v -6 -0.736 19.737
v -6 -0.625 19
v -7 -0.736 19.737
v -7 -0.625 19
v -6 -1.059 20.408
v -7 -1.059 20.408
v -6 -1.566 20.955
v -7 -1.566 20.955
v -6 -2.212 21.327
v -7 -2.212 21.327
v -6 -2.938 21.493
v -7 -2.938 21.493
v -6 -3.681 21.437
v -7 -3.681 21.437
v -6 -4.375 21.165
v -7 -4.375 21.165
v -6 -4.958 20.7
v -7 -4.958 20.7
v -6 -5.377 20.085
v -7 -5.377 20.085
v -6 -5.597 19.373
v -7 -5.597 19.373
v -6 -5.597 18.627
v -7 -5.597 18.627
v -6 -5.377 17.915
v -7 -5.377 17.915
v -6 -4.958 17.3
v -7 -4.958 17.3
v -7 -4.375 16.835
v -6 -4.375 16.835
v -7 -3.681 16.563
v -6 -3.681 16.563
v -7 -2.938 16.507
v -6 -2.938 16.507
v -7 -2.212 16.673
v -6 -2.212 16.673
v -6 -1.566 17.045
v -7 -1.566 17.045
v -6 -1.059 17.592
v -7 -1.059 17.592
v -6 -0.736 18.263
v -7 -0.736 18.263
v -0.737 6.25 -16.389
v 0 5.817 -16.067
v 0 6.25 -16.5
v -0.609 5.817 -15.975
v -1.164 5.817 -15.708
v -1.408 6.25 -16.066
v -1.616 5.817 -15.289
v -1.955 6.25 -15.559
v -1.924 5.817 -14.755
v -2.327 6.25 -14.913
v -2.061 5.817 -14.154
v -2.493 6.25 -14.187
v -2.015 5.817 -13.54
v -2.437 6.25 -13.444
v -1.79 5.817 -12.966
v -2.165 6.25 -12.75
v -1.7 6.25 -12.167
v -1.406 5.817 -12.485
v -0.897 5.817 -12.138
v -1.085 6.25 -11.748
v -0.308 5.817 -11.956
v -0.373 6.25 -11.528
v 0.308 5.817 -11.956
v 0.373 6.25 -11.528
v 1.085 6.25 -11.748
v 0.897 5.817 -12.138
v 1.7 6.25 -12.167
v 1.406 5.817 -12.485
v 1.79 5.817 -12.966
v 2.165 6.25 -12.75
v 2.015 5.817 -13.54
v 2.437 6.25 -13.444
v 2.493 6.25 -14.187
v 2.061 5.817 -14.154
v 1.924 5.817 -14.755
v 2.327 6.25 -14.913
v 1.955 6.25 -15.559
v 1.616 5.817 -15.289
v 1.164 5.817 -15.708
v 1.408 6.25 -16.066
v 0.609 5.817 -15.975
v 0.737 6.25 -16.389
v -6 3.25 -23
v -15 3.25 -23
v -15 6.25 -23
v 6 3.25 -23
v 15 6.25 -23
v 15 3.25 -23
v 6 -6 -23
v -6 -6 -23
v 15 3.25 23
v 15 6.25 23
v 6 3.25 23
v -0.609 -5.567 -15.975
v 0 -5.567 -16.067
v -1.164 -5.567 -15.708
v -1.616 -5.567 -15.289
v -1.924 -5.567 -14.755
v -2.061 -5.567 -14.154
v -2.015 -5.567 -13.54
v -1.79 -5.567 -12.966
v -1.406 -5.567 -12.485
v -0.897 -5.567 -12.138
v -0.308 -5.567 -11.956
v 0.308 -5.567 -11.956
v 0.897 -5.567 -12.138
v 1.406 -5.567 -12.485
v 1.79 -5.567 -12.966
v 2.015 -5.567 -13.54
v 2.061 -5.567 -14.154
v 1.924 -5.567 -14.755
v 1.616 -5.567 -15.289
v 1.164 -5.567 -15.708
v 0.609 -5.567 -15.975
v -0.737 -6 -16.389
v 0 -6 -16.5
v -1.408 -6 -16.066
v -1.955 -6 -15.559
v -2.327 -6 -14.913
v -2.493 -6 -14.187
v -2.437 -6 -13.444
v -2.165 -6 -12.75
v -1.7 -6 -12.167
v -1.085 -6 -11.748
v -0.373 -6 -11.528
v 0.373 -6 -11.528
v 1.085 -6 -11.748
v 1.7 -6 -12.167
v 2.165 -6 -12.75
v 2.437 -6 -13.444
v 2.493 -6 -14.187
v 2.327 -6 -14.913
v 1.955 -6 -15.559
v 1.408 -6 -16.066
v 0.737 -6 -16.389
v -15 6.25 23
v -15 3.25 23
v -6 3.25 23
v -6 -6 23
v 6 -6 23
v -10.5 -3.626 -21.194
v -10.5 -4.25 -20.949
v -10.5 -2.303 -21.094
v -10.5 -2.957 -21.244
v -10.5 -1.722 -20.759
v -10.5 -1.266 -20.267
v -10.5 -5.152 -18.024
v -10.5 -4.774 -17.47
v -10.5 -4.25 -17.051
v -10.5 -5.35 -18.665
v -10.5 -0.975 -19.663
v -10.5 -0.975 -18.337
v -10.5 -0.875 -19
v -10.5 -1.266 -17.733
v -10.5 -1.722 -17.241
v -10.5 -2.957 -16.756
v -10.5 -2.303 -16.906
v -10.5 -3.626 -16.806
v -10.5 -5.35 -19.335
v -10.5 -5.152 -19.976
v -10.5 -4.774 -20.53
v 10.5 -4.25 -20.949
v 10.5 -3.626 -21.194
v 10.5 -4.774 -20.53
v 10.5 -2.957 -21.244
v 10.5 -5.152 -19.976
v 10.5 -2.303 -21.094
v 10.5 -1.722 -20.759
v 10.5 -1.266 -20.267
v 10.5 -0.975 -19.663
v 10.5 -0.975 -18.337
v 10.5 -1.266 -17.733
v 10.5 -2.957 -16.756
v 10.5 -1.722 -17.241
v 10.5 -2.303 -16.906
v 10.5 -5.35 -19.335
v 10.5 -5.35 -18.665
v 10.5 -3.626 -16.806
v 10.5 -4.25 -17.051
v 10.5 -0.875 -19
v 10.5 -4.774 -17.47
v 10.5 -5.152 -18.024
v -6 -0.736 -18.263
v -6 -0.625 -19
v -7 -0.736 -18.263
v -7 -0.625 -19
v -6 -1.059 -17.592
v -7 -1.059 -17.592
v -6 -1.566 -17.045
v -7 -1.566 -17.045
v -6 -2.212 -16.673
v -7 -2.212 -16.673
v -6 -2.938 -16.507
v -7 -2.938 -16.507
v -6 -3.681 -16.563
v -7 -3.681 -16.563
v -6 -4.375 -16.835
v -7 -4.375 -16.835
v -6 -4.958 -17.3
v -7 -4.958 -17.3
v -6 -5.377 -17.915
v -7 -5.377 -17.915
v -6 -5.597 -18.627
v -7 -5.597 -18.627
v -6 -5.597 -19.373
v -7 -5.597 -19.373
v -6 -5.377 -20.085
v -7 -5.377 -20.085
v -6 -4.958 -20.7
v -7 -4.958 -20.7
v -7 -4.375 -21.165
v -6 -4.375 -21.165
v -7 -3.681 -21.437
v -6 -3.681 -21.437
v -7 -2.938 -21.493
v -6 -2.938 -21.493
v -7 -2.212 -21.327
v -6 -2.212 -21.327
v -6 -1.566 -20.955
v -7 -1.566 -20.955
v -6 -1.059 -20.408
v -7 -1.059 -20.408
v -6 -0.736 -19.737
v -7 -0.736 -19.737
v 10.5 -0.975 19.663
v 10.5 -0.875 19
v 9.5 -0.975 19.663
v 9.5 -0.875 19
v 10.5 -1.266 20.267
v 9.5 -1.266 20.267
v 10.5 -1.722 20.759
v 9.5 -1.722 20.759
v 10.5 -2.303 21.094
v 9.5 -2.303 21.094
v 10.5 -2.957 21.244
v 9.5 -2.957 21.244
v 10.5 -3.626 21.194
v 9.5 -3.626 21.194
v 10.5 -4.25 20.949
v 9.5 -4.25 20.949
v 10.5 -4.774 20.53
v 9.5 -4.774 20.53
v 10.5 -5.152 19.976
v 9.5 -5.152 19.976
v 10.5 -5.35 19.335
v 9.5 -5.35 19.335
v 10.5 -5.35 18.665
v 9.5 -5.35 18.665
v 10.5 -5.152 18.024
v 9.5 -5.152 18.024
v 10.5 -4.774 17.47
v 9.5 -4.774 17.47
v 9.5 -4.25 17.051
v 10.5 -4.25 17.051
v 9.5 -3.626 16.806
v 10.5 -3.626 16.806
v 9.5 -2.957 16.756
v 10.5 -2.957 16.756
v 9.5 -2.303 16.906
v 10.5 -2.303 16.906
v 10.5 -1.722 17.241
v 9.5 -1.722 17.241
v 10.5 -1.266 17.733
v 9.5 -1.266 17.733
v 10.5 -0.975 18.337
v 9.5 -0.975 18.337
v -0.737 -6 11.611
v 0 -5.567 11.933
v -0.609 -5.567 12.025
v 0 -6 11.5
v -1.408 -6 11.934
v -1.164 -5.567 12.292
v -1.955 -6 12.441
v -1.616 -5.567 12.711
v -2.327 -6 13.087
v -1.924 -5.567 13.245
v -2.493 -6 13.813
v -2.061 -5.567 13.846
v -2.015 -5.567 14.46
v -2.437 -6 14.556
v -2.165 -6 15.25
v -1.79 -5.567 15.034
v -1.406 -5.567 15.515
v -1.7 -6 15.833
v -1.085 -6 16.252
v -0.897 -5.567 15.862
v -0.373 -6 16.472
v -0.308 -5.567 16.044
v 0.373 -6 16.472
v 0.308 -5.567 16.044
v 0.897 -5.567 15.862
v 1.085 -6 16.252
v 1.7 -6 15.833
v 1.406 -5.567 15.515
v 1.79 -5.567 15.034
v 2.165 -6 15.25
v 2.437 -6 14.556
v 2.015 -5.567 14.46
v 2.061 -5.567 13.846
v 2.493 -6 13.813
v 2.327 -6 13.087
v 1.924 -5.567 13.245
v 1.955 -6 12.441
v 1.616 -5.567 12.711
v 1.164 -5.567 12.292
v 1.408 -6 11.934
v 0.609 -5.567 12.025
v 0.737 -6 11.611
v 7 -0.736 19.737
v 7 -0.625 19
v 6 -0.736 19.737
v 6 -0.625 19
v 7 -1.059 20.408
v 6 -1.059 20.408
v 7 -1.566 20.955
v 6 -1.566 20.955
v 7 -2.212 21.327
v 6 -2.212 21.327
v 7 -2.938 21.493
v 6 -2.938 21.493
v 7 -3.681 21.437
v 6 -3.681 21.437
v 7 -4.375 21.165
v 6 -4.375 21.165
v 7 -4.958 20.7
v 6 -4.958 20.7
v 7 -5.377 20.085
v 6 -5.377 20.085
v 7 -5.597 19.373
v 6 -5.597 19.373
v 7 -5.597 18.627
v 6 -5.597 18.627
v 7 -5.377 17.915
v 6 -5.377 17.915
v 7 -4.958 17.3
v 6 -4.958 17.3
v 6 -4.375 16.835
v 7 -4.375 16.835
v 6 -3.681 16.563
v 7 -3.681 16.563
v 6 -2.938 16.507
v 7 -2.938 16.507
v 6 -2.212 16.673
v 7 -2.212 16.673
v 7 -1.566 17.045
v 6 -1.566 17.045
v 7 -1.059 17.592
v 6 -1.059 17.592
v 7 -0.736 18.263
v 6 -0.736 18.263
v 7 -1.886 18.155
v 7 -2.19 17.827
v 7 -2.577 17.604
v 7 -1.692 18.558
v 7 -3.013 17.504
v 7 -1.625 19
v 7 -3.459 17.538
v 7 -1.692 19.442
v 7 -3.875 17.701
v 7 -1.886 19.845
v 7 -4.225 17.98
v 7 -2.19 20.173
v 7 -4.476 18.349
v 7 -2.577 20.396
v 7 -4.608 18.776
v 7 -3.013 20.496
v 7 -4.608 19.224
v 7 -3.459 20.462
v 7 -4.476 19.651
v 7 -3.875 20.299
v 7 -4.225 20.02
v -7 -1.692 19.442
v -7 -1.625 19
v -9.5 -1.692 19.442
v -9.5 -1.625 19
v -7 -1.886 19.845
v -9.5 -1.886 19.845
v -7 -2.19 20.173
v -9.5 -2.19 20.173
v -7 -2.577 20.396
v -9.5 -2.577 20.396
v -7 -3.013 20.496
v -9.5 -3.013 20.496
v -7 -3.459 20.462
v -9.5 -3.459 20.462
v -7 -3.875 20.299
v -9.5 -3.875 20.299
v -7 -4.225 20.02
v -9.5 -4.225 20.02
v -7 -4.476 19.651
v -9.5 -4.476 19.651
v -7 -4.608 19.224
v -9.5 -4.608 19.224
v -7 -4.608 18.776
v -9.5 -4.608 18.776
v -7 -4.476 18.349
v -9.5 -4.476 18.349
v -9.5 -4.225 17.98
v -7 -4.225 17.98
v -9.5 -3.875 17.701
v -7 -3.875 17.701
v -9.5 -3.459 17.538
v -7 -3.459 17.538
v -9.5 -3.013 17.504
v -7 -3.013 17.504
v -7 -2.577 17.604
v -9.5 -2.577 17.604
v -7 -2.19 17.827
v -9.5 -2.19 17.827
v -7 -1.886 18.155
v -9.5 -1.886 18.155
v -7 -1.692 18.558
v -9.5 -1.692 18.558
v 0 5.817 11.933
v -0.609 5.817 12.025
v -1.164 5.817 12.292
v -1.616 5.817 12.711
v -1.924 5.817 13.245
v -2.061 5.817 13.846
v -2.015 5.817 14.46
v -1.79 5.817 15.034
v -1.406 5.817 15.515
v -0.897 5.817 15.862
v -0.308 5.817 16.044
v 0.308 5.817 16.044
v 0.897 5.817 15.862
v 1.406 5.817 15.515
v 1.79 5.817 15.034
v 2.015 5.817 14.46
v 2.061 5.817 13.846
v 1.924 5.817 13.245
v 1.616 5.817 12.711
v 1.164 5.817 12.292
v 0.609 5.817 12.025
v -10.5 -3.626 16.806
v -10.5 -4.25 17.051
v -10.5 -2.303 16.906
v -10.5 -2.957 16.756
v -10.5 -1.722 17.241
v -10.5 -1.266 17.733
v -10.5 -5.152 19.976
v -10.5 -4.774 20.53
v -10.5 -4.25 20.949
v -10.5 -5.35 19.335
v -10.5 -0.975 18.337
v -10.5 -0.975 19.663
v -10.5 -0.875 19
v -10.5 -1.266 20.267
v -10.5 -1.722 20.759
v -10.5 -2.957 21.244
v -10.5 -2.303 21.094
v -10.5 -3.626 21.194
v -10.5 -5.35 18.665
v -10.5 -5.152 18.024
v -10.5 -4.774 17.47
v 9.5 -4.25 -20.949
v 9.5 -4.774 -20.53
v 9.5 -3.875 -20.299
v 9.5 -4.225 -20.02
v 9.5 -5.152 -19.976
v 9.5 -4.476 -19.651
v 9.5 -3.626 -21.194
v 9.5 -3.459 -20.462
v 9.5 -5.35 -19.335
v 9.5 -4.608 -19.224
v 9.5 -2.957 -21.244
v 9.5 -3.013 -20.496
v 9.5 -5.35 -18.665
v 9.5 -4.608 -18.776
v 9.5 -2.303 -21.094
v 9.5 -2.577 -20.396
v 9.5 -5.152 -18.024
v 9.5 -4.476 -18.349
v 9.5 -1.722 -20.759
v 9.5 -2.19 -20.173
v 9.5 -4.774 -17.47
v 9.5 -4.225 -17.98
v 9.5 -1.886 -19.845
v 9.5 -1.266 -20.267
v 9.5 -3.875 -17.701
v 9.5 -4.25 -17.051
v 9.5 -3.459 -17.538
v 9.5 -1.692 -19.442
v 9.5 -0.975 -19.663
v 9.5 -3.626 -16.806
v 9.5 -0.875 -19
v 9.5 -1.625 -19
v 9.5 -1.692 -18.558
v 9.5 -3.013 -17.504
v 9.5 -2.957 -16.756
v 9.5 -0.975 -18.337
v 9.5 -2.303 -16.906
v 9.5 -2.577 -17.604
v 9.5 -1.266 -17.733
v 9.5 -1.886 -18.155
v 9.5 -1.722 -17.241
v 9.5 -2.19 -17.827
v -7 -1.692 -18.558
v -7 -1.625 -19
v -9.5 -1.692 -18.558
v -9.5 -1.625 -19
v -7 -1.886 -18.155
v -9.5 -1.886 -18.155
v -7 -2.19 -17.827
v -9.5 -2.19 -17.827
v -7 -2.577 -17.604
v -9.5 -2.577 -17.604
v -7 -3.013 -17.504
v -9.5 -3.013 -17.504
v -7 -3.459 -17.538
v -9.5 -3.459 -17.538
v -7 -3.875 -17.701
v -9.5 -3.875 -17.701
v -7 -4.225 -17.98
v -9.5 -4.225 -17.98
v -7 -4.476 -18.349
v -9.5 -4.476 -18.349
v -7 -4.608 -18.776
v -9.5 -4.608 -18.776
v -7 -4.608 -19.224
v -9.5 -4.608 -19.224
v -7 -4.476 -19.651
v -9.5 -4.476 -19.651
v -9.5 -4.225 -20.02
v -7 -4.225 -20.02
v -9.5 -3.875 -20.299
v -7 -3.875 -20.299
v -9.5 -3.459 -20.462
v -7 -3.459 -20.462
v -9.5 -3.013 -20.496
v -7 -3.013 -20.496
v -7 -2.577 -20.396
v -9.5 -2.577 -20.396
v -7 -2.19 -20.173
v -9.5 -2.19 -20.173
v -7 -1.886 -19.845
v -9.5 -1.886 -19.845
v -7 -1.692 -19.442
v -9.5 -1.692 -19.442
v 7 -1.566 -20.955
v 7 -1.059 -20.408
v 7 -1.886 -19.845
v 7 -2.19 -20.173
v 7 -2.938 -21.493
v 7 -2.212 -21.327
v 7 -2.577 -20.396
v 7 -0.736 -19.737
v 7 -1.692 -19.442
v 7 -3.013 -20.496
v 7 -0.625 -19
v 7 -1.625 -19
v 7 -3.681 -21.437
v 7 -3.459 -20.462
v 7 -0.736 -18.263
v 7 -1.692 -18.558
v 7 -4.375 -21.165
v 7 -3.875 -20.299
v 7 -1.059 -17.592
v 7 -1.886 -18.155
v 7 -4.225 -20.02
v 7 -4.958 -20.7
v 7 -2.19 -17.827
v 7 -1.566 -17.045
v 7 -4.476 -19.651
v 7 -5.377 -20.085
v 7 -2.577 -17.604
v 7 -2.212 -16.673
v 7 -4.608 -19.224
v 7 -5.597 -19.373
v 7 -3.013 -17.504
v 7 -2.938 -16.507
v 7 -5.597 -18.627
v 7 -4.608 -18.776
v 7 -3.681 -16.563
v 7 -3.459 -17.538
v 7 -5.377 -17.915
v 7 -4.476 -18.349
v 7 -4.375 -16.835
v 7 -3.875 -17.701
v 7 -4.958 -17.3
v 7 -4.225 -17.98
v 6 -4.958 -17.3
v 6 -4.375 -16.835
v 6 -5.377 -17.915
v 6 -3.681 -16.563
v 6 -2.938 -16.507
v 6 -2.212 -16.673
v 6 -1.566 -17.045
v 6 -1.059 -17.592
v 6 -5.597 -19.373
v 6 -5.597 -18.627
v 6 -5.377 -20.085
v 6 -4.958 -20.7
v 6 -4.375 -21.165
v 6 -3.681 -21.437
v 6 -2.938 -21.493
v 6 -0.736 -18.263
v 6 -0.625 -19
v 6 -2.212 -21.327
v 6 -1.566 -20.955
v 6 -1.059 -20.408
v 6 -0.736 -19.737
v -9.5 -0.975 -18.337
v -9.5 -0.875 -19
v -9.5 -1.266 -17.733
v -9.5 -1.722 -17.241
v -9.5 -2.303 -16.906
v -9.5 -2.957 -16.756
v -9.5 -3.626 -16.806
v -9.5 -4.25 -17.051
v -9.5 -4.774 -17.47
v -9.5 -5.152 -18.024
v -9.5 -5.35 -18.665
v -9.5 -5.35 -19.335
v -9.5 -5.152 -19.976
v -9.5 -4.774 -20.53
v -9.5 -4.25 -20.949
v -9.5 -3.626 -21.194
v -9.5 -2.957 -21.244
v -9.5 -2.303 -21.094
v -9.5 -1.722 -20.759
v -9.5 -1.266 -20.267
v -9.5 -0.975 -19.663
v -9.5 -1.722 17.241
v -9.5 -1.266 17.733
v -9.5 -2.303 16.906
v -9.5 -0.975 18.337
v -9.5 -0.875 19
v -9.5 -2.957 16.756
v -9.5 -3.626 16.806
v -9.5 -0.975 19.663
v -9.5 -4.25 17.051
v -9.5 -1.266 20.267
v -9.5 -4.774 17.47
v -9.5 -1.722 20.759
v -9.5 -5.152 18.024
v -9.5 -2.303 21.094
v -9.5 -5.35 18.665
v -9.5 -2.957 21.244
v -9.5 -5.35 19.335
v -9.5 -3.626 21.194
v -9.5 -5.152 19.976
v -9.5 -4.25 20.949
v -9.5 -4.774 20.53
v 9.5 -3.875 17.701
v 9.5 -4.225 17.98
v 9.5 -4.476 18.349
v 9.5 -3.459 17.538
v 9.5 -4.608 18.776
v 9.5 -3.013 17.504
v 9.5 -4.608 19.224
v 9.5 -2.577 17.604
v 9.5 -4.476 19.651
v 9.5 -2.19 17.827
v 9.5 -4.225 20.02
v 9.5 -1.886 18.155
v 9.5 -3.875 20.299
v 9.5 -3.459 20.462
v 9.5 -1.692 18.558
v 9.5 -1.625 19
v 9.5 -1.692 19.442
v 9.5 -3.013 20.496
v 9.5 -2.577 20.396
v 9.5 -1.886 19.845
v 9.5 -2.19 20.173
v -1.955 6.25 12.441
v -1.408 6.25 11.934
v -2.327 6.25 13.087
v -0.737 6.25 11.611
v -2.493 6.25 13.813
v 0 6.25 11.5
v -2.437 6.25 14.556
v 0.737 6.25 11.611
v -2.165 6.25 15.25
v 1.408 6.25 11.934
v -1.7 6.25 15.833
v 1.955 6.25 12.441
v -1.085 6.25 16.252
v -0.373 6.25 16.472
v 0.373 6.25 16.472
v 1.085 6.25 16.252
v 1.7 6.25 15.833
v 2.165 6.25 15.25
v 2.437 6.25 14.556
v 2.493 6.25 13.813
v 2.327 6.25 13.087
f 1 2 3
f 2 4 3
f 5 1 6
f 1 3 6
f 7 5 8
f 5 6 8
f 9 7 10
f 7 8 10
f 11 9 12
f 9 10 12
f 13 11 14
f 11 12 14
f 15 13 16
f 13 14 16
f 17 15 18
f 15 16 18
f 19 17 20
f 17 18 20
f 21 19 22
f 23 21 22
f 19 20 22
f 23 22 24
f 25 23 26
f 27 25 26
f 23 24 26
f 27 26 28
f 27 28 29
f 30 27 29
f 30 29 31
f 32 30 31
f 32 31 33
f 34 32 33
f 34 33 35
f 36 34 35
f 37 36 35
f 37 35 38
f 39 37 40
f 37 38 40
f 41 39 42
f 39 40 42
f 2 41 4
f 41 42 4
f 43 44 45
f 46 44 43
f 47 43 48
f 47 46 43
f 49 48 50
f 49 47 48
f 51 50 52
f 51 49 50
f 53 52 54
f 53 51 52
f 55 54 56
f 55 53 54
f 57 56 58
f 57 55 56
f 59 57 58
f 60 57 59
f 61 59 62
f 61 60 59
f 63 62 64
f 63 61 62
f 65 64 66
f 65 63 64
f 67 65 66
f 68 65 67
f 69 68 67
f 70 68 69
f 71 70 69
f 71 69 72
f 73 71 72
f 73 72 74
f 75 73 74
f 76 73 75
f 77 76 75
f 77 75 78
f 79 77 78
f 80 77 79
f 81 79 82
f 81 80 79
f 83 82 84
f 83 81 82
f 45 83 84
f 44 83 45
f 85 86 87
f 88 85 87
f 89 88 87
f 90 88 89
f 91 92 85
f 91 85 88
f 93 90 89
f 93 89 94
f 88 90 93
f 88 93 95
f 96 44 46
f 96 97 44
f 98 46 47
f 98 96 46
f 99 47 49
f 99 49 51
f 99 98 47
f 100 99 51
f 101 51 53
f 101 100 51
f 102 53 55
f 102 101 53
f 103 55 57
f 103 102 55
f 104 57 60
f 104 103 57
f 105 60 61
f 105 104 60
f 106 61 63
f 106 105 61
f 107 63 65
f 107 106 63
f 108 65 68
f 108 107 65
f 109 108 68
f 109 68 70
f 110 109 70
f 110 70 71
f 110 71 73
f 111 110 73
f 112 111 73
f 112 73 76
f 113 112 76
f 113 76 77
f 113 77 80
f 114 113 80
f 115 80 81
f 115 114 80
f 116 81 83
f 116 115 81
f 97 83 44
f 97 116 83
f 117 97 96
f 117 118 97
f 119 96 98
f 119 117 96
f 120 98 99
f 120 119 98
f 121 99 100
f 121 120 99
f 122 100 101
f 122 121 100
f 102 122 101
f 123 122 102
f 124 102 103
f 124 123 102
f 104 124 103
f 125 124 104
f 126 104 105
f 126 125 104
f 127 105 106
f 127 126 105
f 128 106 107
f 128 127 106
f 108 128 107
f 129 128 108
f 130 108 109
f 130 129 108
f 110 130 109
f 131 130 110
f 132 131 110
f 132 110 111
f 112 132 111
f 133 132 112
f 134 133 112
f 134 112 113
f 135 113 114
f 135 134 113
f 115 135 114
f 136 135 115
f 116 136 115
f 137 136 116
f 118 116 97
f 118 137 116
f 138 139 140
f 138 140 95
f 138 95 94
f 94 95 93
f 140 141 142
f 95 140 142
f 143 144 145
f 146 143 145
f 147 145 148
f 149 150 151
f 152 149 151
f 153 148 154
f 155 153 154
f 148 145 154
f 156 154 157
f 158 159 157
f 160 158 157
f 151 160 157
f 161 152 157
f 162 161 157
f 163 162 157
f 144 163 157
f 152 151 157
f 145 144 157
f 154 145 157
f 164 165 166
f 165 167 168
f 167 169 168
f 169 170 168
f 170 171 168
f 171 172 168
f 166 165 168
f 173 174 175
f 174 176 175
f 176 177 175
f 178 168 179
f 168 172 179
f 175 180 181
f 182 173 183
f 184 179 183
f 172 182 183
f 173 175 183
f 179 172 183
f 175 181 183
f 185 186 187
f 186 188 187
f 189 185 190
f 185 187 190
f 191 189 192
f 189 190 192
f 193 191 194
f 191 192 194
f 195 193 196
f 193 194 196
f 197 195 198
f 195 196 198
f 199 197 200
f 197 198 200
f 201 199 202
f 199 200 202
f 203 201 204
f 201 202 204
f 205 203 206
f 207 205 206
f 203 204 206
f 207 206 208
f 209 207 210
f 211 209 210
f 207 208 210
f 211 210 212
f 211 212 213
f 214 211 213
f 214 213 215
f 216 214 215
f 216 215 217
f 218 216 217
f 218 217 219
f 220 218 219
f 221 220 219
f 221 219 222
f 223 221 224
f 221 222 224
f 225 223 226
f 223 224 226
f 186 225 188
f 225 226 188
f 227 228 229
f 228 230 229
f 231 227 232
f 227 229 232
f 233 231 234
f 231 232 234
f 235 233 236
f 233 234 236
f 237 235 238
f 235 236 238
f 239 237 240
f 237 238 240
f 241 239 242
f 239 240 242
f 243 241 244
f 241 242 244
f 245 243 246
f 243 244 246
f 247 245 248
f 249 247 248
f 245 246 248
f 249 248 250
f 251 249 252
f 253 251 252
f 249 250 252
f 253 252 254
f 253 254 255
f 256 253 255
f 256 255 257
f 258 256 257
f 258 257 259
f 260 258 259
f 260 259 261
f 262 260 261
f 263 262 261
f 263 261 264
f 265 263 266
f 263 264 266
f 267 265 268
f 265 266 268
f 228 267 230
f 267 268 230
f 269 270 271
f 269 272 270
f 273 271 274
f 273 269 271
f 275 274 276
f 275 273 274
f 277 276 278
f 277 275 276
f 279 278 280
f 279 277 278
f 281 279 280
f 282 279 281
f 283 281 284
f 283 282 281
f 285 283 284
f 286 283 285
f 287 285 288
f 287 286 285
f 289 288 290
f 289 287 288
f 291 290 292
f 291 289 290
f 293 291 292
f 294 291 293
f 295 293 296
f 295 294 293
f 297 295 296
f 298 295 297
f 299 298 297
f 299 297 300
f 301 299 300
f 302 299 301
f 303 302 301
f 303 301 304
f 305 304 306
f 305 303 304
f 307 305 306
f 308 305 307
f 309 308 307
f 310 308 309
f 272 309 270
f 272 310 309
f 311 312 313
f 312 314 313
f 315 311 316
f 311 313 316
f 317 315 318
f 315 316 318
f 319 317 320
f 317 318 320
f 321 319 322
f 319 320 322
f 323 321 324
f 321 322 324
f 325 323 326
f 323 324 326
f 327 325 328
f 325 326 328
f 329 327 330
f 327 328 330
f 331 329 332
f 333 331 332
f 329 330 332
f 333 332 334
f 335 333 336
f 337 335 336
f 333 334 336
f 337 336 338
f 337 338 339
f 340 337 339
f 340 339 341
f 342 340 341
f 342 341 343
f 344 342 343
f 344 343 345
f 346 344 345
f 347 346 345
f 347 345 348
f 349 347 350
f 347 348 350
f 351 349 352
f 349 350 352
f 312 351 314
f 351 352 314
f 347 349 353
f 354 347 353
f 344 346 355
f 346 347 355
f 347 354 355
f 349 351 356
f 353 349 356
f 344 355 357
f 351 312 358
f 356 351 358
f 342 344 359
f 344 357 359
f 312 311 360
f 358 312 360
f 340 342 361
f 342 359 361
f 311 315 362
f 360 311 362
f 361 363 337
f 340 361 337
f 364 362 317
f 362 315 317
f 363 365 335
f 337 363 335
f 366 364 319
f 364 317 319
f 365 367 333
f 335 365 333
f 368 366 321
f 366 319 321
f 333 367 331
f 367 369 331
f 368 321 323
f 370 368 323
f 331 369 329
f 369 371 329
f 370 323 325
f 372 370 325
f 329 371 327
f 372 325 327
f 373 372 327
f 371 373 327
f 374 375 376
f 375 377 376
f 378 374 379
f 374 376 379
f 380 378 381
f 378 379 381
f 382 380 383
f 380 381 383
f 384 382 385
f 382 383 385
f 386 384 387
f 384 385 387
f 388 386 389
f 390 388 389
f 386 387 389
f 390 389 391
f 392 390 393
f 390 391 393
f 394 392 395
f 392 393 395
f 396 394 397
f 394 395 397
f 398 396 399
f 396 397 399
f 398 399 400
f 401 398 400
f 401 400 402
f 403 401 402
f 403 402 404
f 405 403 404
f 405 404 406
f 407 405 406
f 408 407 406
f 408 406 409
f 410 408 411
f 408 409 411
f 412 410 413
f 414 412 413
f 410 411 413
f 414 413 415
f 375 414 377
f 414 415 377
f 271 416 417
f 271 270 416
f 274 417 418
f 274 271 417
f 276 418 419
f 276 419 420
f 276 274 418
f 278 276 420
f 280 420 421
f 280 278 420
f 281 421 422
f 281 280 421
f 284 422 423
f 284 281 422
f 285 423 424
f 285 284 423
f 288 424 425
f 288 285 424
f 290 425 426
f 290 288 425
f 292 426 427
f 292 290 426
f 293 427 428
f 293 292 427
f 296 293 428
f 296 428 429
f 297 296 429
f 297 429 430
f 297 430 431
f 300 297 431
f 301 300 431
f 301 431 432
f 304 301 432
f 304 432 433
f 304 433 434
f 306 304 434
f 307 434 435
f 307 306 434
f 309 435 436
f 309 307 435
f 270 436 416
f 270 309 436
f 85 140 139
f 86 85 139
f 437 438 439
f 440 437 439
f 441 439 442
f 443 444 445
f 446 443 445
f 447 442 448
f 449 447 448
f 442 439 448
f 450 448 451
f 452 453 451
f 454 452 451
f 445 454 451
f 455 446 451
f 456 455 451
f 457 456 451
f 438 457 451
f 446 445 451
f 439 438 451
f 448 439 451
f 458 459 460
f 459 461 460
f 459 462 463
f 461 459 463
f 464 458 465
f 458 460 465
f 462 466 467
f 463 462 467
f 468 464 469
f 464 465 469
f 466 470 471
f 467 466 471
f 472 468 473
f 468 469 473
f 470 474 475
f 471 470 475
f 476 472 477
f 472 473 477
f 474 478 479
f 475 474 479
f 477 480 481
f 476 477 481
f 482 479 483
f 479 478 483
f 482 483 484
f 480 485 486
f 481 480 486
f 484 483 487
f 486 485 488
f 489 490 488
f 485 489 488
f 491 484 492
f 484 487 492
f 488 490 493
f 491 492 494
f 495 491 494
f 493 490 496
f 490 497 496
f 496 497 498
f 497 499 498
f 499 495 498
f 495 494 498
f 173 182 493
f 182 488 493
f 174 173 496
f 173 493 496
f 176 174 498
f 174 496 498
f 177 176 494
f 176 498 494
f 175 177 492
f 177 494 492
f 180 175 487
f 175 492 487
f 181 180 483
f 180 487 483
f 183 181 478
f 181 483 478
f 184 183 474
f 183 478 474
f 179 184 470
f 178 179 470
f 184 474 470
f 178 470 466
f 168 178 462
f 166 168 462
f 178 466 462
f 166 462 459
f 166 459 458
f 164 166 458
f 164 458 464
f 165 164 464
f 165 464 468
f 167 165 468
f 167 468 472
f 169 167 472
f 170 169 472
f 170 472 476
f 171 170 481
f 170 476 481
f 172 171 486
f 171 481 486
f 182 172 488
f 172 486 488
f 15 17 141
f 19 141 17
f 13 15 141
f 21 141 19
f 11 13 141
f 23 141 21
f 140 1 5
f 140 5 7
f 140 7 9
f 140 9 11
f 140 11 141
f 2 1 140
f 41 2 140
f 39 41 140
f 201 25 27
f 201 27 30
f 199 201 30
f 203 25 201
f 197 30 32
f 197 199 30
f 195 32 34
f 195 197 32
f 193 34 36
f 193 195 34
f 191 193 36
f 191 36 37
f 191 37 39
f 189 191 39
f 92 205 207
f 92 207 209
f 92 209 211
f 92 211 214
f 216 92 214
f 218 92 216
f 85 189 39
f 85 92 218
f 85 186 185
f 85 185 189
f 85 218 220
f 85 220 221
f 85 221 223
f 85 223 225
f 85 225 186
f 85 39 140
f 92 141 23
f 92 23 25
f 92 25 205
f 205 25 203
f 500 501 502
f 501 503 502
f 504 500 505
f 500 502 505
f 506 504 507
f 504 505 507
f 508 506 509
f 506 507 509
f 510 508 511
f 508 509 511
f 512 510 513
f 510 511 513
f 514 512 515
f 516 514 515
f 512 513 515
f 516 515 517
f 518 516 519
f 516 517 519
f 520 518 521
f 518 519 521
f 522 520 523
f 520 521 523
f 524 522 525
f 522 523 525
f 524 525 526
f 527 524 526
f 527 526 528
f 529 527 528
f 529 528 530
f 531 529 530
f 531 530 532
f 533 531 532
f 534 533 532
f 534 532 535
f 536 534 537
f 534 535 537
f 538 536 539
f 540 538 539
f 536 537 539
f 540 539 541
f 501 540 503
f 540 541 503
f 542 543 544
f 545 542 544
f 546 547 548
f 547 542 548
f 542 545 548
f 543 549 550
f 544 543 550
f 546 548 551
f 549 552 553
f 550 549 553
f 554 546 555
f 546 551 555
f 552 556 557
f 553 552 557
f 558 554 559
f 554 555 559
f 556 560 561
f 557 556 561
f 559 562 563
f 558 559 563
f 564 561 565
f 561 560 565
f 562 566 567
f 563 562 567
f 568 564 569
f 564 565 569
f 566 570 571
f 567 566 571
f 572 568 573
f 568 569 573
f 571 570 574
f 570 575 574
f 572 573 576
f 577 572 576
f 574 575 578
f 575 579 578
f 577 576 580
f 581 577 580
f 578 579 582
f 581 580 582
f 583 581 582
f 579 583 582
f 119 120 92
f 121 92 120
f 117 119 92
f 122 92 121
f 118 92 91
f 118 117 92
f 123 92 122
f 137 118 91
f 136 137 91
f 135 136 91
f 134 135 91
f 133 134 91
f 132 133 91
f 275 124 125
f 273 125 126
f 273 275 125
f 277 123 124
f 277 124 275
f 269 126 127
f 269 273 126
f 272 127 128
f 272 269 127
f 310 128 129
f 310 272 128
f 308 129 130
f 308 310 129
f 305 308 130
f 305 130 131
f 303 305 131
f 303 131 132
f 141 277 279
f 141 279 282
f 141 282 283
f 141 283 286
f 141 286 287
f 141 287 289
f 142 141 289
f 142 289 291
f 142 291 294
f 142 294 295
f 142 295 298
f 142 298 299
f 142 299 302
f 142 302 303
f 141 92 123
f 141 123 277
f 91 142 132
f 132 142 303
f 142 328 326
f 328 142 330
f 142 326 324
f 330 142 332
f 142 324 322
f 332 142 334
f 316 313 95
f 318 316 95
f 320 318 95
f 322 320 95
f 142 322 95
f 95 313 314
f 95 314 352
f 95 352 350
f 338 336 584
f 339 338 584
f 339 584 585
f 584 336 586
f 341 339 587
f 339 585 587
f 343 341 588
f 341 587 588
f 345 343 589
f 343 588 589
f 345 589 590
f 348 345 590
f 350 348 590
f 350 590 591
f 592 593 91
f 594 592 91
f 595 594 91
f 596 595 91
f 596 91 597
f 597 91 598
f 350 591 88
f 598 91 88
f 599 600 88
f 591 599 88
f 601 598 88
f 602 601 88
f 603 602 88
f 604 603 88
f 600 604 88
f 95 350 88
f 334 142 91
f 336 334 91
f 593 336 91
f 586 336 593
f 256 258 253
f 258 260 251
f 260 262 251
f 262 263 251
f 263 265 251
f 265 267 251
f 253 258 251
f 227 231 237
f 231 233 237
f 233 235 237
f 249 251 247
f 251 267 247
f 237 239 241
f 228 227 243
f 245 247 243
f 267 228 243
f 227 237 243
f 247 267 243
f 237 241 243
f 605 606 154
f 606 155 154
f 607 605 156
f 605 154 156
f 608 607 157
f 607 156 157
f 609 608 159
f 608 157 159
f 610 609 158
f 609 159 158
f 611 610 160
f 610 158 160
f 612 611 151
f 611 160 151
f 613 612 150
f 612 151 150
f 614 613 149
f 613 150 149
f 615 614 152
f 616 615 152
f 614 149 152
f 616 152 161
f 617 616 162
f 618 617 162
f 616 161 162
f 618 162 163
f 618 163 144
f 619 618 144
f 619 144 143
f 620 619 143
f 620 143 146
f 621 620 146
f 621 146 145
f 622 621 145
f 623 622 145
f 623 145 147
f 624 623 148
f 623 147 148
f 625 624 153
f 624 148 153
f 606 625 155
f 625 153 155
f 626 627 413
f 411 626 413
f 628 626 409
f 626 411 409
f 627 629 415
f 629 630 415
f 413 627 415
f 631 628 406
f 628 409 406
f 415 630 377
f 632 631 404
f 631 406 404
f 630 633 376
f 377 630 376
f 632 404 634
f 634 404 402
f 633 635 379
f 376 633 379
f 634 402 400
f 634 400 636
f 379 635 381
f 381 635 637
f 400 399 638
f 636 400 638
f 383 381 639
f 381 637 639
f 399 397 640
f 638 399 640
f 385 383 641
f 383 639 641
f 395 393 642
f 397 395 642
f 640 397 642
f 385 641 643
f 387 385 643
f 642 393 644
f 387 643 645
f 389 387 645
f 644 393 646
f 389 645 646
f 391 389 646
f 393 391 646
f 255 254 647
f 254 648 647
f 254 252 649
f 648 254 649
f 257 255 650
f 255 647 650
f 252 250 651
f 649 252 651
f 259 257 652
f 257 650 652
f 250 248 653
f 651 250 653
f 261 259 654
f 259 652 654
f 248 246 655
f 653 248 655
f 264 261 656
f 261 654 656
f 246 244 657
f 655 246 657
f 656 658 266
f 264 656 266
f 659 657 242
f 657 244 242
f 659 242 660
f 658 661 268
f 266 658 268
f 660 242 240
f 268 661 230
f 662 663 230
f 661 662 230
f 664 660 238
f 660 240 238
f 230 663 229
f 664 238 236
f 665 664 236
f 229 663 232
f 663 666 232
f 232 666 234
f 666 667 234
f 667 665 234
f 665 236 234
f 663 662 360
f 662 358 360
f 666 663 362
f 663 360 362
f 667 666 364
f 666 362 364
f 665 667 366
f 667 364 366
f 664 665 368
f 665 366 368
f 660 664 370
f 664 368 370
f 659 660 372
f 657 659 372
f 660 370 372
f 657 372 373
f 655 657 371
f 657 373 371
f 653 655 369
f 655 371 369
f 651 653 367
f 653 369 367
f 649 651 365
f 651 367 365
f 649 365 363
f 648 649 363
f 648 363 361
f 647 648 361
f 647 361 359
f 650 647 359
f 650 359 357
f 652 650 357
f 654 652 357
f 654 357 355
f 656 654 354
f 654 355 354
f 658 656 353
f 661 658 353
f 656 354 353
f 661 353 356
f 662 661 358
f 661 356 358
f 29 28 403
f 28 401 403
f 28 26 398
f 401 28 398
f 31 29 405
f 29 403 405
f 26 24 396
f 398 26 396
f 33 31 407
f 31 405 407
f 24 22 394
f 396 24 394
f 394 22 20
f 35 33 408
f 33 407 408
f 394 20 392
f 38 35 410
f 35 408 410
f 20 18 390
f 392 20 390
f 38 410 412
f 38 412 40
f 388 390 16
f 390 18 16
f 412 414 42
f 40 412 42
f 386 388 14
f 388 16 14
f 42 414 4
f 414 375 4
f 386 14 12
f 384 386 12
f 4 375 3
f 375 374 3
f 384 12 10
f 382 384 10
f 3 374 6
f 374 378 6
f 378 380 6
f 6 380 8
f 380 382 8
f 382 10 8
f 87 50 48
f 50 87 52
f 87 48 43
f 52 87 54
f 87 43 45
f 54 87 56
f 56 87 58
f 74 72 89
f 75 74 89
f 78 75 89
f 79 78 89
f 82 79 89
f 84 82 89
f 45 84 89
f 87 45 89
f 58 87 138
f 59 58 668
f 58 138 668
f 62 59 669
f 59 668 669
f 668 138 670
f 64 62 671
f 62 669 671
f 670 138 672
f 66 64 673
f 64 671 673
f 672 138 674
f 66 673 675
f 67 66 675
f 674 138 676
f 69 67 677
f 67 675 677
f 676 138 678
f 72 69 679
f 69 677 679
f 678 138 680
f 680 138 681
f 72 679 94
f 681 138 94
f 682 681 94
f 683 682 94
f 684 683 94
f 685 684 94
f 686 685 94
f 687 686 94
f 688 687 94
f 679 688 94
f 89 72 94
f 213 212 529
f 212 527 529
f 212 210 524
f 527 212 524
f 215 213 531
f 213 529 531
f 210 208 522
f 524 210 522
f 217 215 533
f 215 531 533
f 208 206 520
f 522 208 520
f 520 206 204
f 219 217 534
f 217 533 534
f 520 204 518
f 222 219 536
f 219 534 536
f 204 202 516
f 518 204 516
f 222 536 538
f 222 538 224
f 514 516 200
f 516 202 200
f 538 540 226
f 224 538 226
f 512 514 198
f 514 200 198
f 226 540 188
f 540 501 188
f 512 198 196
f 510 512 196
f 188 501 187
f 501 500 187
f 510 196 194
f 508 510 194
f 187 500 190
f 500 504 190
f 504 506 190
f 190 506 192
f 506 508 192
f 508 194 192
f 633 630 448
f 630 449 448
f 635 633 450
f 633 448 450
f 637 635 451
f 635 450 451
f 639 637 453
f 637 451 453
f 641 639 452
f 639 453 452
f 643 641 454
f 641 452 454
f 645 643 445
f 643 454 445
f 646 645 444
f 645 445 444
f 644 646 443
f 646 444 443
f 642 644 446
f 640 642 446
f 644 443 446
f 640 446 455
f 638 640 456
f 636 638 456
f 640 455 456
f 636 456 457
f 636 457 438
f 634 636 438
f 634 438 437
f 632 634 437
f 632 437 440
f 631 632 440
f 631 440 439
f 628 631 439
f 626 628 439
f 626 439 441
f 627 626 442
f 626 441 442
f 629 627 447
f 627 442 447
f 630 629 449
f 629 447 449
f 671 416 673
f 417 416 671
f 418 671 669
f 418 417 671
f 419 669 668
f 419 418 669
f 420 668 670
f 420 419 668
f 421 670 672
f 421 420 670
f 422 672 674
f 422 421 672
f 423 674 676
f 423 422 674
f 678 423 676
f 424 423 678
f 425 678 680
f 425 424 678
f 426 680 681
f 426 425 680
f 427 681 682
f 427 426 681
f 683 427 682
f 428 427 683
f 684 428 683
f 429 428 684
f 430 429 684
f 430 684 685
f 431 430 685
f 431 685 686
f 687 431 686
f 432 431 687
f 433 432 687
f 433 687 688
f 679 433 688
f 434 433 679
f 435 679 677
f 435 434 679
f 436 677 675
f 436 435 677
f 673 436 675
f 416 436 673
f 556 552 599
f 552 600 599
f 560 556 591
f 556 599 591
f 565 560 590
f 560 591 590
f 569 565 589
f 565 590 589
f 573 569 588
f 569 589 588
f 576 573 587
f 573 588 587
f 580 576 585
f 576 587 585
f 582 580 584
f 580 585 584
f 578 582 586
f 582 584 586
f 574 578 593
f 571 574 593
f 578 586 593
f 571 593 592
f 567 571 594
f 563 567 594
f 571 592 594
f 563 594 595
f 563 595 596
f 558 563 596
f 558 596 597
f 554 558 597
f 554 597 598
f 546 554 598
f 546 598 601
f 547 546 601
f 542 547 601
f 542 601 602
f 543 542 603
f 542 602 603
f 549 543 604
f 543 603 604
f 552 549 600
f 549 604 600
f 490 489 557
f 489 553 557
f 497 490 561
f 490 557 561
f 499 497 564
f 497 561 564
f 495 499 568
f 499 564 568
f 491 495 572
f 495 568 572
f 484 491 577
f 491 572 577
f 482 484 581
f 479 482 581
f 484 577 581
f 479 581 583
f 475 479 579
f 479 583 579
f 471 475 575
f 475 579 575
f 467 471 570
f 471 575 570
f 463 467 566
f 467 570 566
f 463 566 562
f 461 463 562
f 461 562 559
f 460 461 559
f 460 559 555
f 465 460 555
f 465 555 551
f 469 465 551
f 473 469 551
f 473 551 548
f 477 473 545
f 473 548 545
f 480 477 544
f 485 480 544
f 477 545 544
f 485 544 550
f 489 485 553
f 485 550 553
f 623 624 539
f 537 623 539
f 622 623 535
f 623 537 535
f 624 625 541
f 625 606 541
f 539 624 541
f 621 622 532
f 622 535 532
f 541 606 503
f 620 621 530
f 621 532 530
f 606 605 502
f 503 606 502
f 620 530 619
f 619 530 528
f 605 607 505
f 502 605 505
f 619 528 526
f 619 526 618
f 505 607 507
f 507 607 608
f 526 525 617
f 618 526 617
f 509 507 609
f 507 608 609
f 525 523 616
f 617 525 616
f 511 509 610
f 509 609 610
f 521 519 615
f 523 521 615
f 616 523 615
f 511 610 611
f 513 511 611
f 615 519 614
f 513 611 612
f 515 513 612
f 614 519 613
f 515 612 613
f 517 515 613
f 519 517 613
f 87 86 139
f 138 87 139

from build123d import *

# Parameters (mm, degrees)
SKETCH_1_W                    = 30
SKETCH_1_H                    = 46
EXTRUDE_1_DEPTH               = 12.25
SKETCH_2_W                    = 9
SKETCH_2_H                    = 9.25
CUT_EXTRUDE_1_DEPTH           = 47
SKETCH_3_W                    = 9
SKETCH_3_H                    = 9.25
CUT_EXTRUDE_2_DEPTH           = 47
HOLE_WIZARD_M3_5_1_AT_2_COUNT = 2
HOLE_WIZARD_M3_5_1_AT_2_PITCH = 28


with BuildPart() as part:
    # 草图1 → 凸台-拉伸1 (new body)
    with BuildSketch(Plane.XZ.offset(6)):
        Rectangle(SKETCH_1_W, SKETCH_1_H)
    extrude(amount=-EXTRUDE_1_DEPTH)

    # 草图2 → 切除-拉伸1 (cut, through all)
    with BuildSketch(Plane(origin=(0, 0, -23), x_dir=(-1, 0, 0), z_dir=(0, 0, -1))):
        with Locations((10.5, -1.375)):
            Rectangle(SKETCH_2_W, SKETCH_2_H)
    extrude(amount=-CUT_EXTRUDE_1_DEPTH, mode=Mode.SUBTRACT)

    # 草图3 → 切除-拉伸2 (cut, through all)
    with BuildSketch(Plane(origin=(0, 0, -23), x_dir=(-1, 0, 0), z_dir=(0, 0, -1))):
        with Locations((-10.5, -1.375)):
            Rectangle(SKETCH_3_W, SKETCH_3_H)
    extrude(amount=-CUT_EXTRUDE_2_DEPTH, mode=Mode.SUBTRACT)

    # 草图4 → 旋转1 (revolve)
    with BuildSketch(Plane.XY.offset(19)):
        Polygon((6, -0.625), (6, -3.125), (10.5, -3.125), (10.5, -0.875), (9.5, -0.875), (9.5, -1.625), (7, -1.625), (7, -0.625), align=None)
    revolve(axis=Axis((6, -3.125, 19), (1, 0, 0)))

    # 草图5 → 旋转2 (revolve)
    with BuildSketch(Plane.XY.offset(19)):
        Polygon((-10.5, -0.875), (-10.5, -3.125), (-6, -3.125), (-6, -0.625), (-7, -0.625), (-7, -1.625), (-9.5, -1.625), (-9.5, -0.875), align=None)
    revolve(axis=Axis((-10.5, -3.125, 19), (1, 0, 0)))

    # 草图6 → 旋转3 (revolve)
    with BuildSketch(Plane.XY.offset(-19)):
        Polygon((6, -0.625), (6, -3.125), (10.5, -3.125), (10.5, -0.875), (9.5, -0.875), (9.5, -1.625), (7, -1.625), (7, -0.625), align=None)
    revolve(axis=Axis((6, -3.125, -19), (1, 0, 0)))

    # 草图7 → 旋转4 (revolve)
    with BuildSketch(Plane.XY.offset(-19)):
        Polygon((-10.5, -0.875), (-10.5, -3.125), (-6, -3.125), (-6, -0.625), (-7, -0.625), (-7, -1.625), (-9.5, -1.625), (-9.5, -0.875), align=None)
    revolve(axis=Axis((-10.5, -3.125, -19), (1, 0, 0)))

    # 草图8 → M3.5 平头机械螺钉的锥形沉头孔1 (revolve, cut)
    with BuildSketch(Plane(origin=(0, -6, -14), x_dir=(0, 0, -1), z_dir=(1, 0, 0))):
        Polygon((0, 0), (0, 12.25), (2.5, 12.25), (2.067, 11.817), (2.067, 0.433), (2.5, 0), align=None)
    hole_wizard_m3_5_1 = revolve(axis=Axis((0, -12.35, -14), (0, 1, 0)), mode=Mode.SUBTRACT)

    # M3.5 平头机械螺钉的锥形沉头孔1 at 2: M3.5 平头机械螺钉的锥形沉头孔1 ×2
    with Locations(*[(0, 0, i * HOLE_WIZARD_M3_5_1_AT_2_PITCH) for i in range(1, HOLE_WIZARD_M3_5_1_AT_2_COUNT)]):
        add(hole_wizard_m3_5_1, mode=Mode.SUBTRACT)


solid = part.part
